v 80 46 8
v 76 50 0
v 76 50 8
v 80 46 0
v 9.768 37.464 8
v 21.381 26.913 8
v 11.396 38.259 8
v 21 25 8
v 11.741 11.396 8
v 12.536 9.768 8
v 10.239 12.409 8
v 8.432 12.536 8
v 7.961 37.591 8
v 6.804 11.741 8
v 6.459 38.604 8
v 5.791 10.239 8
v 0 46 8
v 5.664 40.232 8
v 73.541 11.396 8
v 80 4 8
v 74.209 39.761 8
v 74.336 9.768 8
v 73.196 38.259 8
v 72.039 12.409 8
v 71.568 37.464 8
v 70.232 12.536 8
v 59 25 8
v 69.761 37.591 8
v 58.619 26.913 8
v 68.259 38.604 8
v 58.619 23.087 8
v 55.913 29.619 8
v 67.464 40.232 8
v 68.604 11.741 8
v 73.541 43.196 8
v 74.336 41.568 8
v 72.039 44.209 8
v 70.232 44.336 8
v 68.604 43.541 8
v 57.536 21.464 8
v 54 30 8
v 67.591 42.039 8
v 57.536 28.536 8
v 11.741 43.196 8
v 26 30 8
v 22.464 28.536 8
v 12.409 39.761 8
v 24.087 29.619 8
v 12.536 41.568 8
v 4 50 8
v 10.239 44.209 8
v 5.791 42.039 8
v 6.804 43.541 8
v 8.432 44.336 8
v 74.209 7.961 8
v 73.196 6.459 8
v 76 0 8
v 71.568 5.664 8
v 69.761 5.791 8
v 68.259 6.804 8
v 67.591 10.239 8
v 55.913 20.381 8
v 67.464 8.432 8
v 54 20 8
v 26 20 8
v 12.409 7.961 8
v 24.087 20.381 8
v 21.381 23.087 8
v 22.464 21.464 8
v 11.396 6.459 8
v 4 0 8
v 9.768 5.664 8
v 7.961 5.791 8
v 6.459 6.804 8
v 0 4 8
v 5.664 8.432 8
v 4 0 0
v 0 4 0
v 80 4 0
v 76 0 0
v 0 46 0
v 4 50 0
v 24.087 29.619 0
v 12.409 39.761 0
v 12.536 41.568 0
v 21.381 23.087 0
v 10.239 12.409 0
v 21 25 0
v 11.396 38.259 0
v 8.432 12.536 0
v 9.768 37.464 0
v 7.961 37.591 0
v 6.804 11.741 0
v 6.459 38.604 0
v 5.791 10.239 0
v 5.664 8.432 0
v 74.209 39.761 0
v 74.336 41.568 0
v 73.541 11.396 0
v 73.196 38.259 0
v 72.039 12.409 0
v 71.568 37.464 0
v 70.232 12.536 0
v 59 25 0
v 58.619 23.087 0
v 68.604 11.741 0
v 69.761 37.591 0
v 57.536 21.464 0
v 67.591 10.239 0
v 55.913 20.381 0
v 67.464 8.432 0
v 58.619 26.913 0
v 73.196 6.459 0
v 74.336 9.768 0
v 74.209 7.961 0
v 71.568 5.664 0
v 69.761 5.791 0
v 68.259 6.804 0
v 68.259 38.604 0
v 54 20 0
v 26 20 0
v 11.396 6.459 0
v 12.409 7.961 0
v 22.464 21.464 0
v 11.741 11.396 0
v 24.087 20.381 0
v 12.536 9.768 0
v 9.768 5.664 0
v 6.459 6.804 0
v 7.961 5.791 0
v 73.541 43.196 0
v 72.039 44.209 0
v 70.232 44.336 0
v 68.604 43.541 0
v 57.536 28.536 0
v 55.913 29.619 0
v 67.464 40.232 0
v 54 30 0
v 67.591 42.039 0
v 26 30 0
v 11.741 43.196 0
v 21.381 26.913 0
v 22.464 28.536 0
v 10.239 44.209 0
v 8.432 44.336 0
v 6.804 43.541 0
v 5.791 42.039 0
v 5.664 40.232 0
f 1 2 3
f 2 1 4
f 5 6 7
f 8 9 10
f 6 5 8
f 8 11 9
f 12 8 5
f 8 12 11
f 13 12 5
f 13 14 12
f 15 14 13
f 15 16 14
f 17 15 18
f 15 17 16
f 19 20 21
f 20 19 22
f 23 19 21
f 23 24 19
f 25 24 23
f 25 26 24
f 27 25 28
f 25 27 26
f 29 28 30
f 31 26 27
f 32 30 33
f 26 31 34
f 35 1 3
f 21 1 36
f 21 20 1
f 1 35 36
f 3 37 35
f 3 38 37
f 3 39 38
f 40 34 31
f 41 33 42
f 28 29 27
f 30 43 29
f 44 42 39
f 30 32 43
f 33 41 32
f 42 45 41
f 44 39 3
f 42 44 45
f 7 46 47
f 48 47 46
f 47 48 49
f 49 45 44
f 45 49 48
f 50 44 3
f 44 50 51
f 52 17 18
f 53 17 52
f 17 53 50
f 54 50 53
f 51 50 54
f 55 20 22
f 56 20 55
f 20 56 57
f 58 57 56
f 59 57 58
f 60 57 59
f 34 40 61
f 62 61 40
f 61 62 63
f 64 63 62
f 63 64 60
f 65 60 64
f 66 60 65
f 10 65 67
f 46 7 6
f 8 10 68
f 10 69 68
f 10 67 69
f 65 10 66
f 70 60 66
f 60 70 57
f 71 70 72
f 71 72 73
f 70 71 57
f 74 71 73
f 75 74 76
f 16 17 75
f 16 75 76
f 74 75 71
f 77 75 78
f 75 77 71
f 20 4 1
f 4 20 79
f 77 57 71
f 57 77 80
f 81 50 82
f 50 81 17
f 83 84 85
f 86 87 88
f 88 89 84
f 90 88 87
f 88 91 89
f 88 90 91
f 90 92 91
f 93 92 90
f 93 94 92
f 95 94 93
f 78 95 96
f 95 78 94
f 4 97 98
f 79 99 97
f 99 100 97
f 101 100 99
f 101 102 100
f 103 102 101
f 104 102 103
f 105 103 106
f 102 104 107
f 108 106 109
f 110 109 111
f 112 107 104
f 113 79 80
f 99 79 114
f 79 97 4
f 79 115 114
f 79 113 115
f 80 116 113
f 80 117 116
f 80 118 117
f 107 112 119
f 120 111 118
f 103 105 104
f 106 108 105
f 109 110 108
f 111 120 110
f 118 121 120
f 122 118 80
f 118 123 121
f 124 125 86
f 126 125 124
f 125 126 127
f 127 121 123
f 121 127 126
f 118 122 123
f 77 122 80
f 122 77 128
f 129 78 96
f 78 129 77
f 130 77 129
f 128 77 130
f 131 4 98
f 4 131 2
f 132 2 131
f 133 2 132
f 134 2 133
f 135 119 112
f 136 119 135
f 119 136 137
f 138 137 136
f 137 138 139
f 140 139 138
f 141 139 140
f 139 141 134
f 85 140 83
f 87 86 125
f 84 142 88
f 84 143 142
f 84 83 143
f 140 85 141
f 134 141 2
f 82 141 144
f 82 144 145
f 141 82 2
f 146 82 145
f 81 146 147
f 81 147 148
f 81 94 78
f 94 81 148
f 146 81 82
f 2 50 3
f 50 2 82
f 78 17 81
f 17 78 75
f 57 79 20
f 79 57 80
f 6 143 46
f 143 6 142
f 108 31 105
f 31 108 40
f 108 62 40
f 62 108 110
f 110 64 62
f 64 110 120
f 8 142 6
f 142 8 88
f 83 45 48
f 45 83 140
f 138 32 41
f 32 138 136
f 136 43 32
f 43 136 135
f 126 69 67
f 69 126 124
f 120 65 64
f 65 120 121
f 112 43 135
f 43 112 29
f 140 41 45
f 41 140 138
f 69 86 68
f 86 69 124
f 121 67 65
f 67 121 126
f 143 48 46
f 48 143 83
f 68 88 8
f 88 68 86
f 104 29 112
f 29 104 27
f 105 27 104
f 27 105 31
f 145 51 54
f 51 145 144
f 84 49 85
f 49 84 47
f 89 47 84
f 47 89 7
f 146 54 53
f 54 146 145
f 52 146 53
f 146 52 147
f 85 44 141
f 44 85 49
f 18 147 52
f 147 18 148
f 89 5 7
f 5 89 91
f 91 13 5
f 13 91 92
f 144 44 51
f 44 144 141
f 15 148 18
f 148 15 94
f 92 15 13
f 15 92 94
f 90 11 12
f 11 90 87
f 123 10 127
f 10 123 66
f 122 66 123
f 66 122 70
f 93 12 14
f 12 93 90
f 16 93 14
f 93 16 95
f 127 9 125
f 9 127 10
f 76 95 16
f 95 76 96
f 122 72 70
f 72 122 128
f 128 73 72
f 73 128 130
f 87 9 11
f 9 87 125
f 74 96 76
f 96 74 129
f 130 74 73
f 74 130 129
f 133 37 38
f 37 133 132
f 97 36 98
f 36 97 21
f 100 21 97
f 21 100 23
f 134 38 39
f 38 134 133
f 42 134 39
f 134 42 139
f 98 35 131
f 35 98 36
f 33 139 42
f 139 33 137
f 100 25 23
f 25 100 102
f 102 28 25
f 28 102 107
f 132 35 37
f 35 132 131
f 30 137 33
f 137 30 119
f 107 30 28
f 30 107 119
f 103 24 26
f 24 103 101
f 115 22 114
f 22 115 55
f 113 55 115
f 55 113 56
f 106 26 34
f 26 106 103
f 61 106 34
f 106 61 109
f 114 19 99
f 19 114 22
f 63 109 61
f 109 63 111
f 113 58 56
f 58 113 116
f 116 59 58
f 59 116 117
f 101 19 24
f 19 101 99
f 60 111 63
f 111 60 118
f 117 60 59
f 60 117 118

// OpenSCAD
$fn = 32;

// ----------------------------------------------------------------------
// Bracket plate: slot plate 80 x 50
// ----------------------------------------------------------------------

// --- parameters (mm) ---
hole_r = 3.5;             // bolt hole radius
plate_t = 8;              // plate thickness, Z (extrusion height)
plate_l = 80;             // plate length
plate_w = 50;             // plate width
slot_l = 28;              // slot straight length
slot_r = 5;               // slot end radius

slot_len = slot_l + 2 * slot_r;
slot_w = 2 * slot_r;
hole_d2 = 2 * hole_r;

profile = [[4, 0], [76, 0], [80, 4], [80, 46], [76, 50], [4, 50], [0, 46], [0, 4]];  // primary outline, 8 points, counter clockwise
void_1 = [[54, 20], [55.913, 20.381], [57.536, 21.464], [58.619, 23.087], [59, 25], [58.619, 26.913], [57.536, 28.536], [55.913, 29.619], [54, 30], [26, 30], [24.087, 29.619], [22.464, 28.536], [21.381, 26.913], [21, 25], [21.381, 23.087], [22.464, 21.464], [24.087, 20.381], [26, 20]];  // grip slot, 18 points
void_2 = [[12.536, 41.568], [11.741, 43.196], [10.239, 44.209], [8.432, 44.336], [6.804, 43.541], [5.791, 42.039], [5.664, 40.232], [6.459, 38.604], [7.961, 37.591], [9.768, 37.464], [11.396, 38.259], [12.409, 39.761]];  // corner hole, 12 points
void_3 = [[12.536, 9.768], [11.741, 11.396], [10.239, 12.409], [8.432, 12.536], [6.804, 11.741], [5.791, 10.239], [5.664, 8.432], [6.459, 6.804], [7.961, 5.791], [9.768, 5.664], [11.396, 6.459], [12.409, 7.961]];  // corner hole, 12 points
void_4 = [[74.336, 41.568], [73.541, 43.196], [72.039, 44.209], [70.232, 44.336], [68.604, 43.541], [67.591, 42.039], [67.464, 40.232], [68.259, 38.604], [69.761, 37.591], [71.568, 37.464], [73.196, 38.259], [74.209, 39.761]];  // corner hole, 12 points
void_5 = [[74.336, 9.768], [73.541, 11.396], [72.039, 12.409], [70.232, 12.536], [68.604, 11.741], [67.591, 10.239], [67.464, 8.432], [68.259, 6.804], [69.761, 5.791], [71.568, 5.664], [73.196, 6.459], [74.209, 7.961]];  // corner hole, 12 points

// --- the one profile operation ---
difference() {
  linear_extrude(height = plate_t) polygon(points = profile);
  translate([0, 0, -1])
    linear_extrude(height = plate_t + 2) polygon(points = void_1);
  translate([0, 0, -1])
    linear_extrude(height = plate_t + 2) polygon(points = void_2);
  translate([0, 0, -1])
    linear_extrude(height = plate_t + 2) polygon(points = void_3);
  translate([0, 0, -1])
    linear_extrude(height = plate_t + 2) polygon(points = void_4);
  translate([0, 0, -1])
    linear_extrude(height = plate_t + 2) polygon(points = void_5);
}
